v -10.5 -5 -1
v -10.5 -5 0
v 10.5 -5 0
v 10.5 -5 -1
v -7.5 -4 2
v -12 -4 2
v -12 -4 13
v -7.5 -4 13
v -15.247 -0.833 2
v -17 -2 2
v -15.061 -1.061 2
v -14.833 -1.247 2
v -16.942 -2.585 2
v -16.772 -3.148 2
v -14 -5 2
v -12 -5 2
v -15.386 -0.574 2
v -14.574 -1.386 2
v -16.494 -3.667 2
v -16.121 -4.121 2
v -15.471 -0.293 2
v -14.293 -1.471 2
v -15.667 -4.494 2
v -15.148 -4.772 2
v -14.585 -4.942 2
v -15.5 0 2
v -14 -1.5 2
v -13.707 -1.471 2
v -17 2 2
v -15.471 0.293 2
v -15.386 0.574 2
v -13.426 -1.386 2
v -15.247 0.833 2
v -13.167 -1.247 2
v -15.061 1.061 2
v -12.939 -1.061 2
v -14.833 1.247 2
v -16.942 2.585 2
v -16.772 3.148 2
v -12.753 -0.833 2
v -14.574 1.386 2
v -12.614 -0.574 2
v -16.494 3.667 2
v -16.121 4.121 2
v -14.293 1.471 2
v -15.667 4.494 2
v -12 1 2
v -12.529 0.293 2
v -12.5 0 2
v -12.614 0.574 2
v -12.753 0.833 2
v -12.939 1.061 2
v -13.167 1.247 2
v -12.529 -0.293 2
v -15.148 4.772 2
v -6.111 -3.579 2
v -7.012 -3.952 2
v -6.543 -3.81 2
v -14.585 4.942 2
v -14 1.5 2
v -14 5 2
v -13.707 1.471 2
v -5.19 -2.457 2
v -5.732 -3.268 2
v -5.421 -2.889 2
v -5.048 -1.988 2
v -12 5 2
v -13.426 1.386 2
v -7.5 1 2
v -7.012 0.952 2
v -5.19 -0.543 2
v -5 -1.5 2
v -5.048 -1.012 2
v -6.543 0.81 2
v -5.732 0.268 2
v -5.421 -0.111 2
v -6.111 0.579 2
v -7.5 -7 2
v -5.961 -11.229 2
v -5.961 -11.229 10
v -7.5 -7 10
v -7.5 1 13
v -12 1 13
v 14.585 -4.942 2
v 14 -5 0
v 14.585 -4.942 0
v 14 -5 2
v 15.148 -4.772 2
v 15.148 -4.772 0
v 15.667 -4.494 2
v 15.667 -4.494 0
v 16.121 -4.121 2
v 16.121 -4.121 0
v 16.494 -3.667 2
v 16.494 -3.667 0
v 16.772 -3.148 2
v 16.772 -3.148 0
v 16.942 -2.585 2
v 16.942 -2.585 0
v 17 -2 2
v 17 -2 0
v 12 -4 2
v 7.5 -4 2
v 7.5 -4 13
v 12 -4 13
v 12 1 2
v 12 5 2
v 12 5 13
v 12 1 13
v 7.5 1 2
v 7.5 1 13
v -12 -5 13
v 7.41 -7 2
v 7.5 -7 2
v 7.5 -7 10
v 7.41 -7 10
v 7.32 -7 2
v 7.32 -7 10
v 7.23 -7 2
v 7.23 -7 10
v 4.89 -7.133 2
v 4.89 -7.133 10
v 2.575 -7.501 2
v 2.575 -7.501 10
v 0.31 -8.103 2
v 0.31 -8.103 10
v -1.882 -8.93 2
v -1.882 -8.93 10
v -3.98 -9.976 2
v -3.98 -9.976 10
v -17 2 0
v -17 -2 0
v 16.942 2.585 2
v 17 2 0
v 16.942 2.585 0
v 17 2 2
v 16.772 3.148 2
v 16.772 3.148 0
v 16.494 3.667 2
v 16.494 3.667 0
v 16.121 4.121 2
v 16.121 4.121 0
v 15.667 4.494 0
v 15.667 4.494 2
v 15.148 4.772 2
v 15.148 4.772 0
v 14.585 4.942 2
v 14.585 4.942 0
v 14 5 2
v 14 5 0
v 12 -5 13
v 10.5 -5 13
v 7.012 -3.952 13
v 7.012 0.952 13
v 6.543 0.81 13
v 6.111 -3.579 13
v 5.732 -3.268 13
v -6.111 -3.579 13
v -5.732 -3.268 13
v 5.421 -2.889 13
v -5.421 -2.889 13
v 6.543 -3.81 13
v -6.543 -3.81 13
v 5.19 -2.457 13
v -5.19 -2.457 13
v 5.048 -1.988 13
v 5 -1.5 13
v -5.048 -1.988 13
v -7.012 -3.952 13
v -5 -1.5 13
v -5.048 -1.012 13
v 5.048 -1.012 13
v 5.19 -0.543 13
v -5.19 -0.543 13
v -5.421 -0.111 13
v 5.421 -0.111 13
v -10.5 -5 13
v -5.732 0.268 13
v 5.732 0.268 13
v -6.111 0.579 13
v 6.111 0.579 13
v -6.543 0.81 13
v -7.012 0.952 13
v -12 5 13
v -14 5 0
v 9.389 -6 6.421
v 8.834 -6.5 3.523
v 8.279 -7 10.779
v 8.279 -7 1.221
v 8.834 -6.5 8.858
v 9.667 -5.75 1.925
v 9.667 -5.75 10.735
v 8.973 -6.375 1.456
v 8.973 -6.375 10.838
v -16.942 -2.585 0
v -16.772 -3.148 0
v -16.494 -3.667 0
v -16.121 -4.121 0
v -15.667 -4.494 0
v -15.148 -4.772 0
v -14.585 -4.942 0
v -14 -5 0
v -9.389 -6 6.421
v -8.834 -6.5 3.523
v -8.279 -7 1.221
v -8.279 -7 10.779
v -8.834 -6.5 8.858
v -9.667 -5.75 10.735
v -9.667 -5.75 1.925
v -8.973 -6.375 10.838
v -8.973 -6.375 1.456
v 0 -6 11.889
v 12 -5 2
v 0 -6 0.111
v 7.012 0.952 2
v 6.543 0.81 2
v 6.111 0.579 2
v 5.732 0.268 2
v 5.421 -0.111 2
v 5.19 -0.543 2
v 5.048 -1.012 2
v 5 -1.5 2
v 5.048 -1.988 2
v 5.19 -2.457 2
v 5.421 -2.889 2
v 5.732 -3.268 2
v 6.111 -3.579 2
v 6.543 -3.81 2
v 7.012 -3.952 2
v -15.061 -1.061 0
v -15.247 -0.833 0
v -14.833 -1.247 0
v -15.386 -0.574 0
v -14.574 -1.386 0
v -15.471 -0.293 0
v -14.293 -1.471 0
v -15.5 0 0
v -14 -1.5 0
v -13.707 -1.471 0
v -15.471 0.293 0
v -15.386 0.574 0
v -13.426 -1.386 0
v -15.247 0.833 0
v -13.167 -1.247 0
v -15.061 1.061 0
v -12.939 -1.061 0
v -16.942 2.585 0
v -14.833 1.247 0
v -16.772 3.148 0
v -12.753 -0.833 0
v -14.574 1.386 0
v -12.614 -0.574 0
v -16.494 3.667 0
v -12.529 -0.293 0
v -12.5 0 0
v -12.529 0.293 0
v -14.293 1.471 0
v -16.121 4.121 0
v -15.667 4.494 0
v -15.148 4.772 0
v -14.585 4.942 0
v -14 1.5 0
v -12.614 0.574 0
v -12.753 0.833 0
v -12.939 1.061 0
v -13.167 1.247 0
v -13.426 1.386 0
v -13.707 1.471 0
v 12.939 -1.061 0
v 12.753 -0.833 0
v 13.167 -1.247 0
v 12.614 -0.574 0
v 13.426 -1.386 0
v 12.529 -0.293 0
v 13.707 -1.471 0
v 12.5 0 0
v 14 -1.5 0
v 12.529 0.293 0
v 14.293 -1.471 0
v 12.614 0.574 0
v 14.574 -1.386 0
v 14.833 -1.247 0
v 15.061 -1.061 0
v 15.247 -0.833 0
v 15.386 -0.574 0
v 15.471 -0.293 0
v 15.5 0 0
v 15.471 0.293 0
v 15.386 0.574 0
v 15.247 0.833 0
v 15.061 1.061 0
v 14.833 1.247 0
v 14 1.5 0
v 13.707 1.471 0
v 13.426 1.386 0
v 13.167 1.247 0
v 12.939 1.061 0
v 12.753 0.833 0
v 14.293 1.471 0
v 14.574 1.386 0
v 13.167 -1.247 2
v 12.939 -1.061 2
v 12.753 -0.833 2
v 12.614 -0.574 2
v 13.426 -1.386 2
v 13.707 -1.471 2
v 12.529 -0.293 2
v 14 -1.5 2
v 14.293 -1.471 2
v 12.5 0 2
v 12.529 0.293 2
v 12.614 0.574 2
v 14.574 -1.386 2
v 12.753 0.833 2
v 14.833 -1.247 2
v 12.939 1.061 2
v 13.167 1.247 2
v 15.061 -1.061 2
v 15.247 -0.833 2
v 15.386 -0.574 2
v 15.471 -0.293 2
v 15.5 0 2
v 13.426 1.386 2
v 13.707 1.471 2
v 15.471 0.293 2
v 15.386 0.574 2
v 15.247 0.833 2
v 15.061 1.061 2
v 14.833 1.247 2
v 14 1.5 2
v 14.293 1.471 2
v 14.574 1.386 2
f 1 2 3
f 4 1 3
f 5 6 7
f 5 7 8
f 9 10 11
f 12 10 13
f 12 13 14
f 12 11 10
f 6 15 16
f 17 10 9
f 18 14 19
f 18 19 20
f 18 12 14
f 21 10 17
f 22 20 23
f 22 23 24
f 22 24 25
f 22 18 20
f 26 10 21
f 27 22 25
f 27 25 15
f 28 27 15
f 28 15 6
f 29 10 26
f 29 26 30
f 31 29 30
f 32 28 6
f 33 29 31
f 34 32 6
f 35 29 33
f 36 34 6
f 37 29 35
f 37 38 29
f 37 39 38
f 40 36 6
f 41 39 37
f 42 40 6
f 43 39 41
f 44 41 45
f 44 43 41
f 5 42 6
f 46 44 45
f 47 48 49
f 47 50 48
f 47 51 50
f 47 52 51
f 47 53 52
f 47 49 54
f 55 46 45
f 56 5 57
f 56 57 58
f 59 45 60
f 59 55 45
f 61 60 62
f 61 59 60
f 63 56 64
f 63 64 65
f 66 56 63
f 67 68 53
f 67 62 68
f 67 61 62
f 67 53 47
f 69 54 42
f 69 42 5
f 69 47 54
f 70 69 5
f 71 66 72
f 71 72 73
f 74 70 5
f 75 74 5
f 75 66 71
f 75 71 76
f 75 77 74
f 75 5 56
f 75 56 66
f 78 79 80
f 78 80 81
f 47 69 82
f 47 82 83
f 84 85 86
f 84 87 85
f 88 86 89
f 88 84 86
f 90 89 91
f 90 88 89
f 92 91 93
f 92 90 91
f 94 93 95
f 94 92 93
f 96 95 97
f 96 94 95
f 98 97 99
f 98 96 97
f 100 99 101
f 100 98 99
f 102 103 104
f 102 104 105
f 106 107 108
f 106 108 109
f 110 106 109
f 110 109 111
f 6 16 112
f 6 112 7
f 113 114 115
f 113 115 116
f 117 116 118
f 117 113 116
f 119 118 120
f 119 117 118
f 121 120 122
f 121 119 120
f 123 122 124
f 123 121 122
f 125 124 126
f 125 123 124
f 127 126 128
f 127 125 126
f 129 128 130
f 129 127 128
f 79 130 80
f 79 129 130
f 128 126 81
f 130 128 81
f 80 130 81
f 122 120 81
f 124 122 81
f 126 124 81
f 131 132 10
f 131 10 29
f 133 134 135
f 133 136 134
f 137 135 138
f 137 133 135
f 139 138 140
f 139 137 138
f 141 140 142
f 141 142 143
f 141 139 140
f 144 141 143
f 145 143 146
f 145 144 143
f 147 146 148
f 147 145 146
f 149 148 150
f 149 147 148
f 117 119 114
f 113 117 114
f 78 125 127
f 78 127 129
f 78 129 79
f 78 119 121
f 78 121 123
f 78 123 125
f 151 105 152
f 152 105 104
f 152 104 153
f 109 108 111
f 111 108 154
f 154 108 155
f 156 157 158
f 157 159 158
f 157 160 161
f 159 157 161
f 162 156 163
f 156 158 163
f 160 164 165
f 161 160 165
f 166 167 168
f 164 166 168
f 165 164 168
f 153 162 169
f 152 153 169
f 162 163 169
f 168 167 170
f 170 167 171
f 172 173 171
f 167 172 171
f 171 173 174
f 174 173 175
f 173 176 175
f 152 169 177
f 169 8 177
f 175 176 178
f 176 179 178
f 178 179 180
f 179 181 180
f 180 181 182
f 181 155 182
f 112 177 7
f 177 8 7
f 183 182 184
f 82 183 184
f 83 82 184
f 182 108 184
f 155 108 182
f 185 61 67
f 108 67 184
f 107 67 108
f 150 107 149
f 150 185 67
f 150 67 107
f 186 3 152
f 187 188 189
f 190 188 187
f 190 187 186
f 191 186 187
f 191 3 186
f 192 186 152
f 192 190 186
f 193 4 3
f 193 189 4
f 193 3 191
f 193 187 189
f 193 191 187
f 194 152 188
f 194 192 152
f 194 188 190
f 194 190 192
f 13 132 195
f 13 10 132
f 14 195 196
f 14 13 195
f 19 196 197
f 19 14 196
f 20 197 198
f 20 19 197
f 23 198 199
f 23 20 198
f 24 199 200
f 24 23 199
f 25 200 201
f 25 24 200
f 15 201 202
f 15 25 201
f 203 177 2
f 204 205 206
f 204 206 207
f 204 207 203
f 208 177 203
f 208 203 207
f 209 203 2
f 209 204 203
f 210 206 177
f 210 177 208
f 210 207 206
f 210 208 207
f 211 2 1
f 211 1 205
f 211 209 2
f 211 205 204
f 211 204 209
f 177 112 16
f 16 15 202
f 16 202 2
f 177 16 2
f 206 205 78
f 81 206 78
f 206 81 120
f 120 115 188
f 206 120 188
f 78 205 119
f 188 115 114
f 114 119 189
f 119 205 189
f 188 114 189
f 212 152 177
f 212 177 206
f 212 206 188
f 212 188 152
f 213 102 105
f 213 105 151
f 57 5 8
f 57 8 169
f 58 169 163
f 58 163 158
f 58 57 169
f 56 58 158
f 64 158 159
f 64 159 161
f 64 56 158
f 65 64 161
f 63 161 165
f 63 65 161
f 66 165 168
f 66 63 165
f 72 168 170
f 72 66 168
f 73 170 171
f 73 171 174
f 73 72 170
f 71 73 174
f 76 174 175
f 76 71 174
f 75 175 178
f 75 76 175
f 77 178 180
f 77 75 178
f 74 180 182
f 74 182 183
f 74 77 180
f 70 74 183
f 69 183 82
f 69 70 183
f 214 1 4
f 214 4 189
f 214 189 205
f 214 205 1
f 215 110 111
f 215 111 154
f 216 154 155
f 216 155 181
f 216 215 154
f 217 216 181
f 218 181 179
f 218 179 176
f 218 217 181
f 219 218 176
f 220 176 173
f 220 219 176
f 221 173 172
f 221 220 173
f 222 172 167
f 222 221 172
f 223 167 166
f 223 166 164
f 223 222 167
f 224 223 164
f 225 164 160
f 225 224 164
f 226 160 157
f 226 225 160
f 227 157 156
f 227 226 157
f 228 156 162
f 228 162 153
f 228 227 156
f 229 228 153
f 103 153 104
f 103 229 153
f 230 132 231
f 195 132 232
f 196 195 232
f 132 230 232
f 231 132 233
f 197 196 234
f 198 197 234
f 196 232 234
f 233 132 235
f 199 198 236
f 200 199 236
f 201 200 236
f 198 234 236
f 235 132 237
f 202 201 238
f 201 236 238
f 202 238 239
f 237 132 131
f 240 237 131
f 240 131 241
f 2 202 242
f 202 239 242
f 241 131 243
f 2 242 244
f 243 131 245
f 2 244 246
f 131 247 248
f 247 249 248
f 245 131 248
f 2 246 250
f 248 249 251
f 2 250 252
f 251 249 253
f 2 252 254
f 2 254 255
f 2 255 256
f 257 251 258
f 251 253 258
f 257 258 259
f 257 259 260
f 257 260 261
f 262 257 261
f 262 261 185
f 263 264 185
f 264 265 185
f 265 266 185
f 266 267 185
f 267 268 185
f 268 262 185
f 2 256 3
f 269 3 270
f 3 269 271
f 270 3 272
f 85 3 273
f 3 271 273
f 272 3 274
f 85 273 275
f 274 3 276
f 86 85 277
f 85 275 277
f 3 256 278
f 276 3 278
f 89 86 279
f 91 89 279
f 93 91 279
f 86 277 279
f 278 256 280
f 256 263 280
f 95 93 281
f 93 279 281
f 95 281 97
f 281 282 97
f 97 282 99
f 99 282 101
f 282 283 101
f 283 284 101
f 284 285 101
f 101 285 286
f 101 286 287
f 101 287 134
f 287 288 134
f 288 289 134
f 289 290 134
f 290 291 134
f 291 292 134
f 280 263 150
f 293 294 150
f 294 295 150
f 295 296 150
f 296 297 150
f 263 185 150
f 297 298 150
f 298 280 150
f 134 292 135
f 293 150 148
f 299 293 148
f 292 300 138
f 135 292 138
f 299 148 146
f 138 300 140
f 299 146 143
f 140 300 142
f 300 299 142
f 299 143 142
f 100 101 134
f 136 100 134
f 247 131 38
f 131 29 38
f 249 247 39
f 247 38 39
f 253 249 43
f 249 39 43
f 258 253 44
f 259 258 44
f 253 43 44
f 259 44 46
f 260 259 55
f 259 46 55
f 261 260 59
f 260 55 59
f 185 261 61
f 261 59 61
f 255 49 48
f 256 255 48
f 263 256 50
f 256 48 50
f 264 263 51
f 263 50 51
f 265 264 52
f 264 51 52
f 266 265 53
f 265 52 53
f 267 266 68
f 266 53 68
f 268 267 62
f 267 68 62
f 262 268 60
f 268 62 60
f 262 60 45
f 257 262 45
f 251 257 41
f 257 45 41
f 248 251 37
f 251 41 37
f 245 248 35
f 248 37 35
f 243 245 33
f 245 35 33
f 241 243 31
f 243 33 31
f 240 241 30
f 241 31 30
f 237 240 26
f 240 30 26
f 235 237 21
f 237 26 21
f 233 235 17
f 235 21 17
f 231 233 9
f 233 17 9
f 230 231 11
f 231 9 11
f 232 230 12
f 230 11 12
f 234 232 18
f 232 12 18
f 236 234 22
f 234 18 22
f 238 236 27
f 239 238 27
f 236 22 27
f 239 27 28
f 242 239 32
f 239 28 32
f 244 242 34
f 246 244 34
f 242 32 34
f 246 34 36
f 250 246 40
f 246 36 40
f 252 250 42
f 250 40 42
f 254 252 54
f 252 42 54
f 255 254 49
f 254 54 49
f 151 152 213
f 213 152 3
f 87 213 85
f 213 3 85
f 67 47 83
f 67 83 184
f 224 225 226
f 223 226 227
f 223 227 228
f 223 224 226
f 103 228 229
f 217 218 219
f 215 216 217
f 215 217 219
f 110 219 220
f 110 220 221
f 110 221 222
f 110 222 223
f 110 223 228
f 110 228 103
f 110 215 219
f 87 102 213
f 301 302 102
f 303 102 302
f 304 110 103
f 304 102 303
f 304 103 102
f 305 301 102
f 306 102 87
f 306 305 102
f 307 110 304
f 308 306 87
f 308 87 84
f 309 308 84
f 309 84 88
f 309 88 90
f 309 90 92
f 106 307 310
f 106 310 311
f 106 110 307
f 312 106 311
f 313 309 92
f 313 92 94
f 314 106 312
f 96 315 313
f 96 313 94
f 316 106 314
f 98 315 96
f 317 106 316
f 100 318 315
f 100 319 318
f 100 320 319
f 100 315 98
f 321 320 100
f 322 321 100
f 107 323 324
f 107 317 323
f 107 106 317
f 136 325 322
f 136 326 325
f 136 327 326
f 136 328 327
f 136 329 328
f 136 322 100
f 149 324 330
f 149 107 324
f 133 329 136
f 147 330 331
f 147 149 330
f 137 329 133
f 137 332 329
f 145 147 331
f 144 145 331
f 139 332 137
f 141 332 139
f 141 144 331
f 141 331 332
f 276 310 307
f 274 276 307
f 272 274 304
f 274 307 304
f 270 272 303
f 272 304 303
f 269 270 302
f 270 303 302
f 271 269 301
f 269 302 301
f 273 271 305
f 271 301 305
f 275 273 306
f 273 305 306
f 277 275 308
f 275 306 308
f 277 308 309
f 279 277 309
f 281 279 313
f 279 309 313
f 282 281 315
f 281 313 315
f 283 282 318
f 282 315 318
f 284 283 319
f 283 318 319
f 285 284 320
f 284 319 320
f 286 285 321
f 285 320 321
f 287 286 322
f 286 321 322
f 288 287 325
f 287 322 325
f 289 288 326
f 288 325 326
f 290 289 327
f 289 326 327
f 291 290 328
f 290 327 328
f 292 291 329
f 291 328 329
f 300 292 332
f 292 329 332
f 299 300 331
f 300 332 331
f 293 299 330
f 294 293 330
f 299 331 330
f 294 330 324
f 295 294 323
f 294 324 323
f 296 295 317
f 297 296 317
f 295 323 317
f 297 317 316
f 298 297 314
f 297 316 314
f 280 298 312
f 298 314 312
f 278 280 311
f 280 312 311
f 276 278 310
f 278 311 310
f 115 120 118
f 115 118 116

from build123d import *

# Parameters (mm, degrees)
SKETCH_1_W          = 34
SKETCH_1_H          = 10
EXTRUDE_1_DEPTH     = 2
FILLET_1_R          = 3
SKETCH_2_R          = 1.5
CUT_EXTRUDE_1_DEPTH = 2
EXTRUDE_2_DEPTH     = 11
SKETCH_5_W          = 21
SKETCH_5_H          = 14
EXTRUDE_4_DEPTH     = 2
EXTRUDE_4_TAPER     = 48
SKETCH_6_W          = 15
SKETCH_6_H          = 8
CUT_EXTRUDE_2_DEPTH = 0.3
EXTRUDE_5_DEPTH     = 8


with BuildPart() as part:
    # 草图1 → 凸台-拉伸1 (new body)
    with BuildSketch(Plane.XY):
        Rectangle(SKETCH_1_W, SKETCH_1_H)
    extrude(amount=EXTRUDE_1_DEPTH)

    # 圆角1
    fillet_1_edges = [part.edges().sort_by_distance(p)[0] for p in [
        (-17, 5, 1),
        (17, 5, 1),
        (17, -5, 1),
        (-17, -5, 1),
    ]]
    fillet(fillet_1_edges, radius=FILLET_1_R)

    # 草图2 → 切除-拉伸1 (cut)
    with BuildSketch(Plane.XY.offset(2)):
        with Locations((-14, 0)):
            Circle(SKETCH_2_R)
        with Locations(Location((14, 0, 0), (0, 0, 180))):
            Circle(SKETCH_2_R)
    extrude(amount=-CUT_EXTRUDE_1_DEPTH, mode=Mode.SUBTRACT)

    # 草图3 → 凸台-拉伸2 (add)
    with BuildSketch(Plane.XY.offset(2)):
        with BuildLine():
            Line((12, -5), (-12, -5))
            Line((-12, -5), (-12, -4))
            Line((-12, -4), (-7.5, -4))
            ThreePointArc((-7.5, -4), (-5, -1.5), (-7.5, 1))
            Line((-7.5, 1), (-12, 1))
            Line((-12, 1), (-12, 5))
            Line((-12, 5), (12, 5))
            Line((12, 5), (12, 1))
            Line((12, 1), (7.5, 1))
            ThreePointArc((7.5, 1), (5, -1.5), (7.5, -4))
            Line((7.5, -4), (12, -4))
            Line((12, -4), (12, -5))
        make_face()
    extrude(amount=EXTRUDE_2_DEPTH)

    # 草图5 → 凸台-拉伸4 (add)
    with BuildSketch(Plane.XZ.offset(5)):
        with Locations((0, 6)):
            Rectangle(SKETCH_5_W, SKETCH_5_H)
    extrude(amount=EXTRUDE_4_DEPTH, taper=EXTRUDE_4_TAPER)

    # 草图6 → 切除-拉伸2 (cut)
    with BuildSketch(Plane.XZ.offset(7)):
        with Locations((0, 6)):
            Rectangle(SKETCH_6_W, SKETCH_6_H)
    extrude(amount=-CUT_EXTRUDE_2_DEPTH, mode=Mode.SUBTRACT)

    # 草图8 → 凸台-拉伸5 (add)
    with BuildSketch(Plane.XY.offset(2)):
        with BuildLine():
            Line((7.5, -6.7), (7.5, -7))
            ThreePointArc((7.5, -7), (0.438935642, -8.061882235), (-5.960909355, -11.228616794))
            Line((-5.960909355, -11.228616794), (-7.5, -7))
            Line((-7.5, -7), (-7.5, -6.7))
            Line((-7.5, -6.7), (7.5, -6.7))
        make_face()
    extrude(amount=EXTRUDE_5_DEPTH)


solid = part.part
